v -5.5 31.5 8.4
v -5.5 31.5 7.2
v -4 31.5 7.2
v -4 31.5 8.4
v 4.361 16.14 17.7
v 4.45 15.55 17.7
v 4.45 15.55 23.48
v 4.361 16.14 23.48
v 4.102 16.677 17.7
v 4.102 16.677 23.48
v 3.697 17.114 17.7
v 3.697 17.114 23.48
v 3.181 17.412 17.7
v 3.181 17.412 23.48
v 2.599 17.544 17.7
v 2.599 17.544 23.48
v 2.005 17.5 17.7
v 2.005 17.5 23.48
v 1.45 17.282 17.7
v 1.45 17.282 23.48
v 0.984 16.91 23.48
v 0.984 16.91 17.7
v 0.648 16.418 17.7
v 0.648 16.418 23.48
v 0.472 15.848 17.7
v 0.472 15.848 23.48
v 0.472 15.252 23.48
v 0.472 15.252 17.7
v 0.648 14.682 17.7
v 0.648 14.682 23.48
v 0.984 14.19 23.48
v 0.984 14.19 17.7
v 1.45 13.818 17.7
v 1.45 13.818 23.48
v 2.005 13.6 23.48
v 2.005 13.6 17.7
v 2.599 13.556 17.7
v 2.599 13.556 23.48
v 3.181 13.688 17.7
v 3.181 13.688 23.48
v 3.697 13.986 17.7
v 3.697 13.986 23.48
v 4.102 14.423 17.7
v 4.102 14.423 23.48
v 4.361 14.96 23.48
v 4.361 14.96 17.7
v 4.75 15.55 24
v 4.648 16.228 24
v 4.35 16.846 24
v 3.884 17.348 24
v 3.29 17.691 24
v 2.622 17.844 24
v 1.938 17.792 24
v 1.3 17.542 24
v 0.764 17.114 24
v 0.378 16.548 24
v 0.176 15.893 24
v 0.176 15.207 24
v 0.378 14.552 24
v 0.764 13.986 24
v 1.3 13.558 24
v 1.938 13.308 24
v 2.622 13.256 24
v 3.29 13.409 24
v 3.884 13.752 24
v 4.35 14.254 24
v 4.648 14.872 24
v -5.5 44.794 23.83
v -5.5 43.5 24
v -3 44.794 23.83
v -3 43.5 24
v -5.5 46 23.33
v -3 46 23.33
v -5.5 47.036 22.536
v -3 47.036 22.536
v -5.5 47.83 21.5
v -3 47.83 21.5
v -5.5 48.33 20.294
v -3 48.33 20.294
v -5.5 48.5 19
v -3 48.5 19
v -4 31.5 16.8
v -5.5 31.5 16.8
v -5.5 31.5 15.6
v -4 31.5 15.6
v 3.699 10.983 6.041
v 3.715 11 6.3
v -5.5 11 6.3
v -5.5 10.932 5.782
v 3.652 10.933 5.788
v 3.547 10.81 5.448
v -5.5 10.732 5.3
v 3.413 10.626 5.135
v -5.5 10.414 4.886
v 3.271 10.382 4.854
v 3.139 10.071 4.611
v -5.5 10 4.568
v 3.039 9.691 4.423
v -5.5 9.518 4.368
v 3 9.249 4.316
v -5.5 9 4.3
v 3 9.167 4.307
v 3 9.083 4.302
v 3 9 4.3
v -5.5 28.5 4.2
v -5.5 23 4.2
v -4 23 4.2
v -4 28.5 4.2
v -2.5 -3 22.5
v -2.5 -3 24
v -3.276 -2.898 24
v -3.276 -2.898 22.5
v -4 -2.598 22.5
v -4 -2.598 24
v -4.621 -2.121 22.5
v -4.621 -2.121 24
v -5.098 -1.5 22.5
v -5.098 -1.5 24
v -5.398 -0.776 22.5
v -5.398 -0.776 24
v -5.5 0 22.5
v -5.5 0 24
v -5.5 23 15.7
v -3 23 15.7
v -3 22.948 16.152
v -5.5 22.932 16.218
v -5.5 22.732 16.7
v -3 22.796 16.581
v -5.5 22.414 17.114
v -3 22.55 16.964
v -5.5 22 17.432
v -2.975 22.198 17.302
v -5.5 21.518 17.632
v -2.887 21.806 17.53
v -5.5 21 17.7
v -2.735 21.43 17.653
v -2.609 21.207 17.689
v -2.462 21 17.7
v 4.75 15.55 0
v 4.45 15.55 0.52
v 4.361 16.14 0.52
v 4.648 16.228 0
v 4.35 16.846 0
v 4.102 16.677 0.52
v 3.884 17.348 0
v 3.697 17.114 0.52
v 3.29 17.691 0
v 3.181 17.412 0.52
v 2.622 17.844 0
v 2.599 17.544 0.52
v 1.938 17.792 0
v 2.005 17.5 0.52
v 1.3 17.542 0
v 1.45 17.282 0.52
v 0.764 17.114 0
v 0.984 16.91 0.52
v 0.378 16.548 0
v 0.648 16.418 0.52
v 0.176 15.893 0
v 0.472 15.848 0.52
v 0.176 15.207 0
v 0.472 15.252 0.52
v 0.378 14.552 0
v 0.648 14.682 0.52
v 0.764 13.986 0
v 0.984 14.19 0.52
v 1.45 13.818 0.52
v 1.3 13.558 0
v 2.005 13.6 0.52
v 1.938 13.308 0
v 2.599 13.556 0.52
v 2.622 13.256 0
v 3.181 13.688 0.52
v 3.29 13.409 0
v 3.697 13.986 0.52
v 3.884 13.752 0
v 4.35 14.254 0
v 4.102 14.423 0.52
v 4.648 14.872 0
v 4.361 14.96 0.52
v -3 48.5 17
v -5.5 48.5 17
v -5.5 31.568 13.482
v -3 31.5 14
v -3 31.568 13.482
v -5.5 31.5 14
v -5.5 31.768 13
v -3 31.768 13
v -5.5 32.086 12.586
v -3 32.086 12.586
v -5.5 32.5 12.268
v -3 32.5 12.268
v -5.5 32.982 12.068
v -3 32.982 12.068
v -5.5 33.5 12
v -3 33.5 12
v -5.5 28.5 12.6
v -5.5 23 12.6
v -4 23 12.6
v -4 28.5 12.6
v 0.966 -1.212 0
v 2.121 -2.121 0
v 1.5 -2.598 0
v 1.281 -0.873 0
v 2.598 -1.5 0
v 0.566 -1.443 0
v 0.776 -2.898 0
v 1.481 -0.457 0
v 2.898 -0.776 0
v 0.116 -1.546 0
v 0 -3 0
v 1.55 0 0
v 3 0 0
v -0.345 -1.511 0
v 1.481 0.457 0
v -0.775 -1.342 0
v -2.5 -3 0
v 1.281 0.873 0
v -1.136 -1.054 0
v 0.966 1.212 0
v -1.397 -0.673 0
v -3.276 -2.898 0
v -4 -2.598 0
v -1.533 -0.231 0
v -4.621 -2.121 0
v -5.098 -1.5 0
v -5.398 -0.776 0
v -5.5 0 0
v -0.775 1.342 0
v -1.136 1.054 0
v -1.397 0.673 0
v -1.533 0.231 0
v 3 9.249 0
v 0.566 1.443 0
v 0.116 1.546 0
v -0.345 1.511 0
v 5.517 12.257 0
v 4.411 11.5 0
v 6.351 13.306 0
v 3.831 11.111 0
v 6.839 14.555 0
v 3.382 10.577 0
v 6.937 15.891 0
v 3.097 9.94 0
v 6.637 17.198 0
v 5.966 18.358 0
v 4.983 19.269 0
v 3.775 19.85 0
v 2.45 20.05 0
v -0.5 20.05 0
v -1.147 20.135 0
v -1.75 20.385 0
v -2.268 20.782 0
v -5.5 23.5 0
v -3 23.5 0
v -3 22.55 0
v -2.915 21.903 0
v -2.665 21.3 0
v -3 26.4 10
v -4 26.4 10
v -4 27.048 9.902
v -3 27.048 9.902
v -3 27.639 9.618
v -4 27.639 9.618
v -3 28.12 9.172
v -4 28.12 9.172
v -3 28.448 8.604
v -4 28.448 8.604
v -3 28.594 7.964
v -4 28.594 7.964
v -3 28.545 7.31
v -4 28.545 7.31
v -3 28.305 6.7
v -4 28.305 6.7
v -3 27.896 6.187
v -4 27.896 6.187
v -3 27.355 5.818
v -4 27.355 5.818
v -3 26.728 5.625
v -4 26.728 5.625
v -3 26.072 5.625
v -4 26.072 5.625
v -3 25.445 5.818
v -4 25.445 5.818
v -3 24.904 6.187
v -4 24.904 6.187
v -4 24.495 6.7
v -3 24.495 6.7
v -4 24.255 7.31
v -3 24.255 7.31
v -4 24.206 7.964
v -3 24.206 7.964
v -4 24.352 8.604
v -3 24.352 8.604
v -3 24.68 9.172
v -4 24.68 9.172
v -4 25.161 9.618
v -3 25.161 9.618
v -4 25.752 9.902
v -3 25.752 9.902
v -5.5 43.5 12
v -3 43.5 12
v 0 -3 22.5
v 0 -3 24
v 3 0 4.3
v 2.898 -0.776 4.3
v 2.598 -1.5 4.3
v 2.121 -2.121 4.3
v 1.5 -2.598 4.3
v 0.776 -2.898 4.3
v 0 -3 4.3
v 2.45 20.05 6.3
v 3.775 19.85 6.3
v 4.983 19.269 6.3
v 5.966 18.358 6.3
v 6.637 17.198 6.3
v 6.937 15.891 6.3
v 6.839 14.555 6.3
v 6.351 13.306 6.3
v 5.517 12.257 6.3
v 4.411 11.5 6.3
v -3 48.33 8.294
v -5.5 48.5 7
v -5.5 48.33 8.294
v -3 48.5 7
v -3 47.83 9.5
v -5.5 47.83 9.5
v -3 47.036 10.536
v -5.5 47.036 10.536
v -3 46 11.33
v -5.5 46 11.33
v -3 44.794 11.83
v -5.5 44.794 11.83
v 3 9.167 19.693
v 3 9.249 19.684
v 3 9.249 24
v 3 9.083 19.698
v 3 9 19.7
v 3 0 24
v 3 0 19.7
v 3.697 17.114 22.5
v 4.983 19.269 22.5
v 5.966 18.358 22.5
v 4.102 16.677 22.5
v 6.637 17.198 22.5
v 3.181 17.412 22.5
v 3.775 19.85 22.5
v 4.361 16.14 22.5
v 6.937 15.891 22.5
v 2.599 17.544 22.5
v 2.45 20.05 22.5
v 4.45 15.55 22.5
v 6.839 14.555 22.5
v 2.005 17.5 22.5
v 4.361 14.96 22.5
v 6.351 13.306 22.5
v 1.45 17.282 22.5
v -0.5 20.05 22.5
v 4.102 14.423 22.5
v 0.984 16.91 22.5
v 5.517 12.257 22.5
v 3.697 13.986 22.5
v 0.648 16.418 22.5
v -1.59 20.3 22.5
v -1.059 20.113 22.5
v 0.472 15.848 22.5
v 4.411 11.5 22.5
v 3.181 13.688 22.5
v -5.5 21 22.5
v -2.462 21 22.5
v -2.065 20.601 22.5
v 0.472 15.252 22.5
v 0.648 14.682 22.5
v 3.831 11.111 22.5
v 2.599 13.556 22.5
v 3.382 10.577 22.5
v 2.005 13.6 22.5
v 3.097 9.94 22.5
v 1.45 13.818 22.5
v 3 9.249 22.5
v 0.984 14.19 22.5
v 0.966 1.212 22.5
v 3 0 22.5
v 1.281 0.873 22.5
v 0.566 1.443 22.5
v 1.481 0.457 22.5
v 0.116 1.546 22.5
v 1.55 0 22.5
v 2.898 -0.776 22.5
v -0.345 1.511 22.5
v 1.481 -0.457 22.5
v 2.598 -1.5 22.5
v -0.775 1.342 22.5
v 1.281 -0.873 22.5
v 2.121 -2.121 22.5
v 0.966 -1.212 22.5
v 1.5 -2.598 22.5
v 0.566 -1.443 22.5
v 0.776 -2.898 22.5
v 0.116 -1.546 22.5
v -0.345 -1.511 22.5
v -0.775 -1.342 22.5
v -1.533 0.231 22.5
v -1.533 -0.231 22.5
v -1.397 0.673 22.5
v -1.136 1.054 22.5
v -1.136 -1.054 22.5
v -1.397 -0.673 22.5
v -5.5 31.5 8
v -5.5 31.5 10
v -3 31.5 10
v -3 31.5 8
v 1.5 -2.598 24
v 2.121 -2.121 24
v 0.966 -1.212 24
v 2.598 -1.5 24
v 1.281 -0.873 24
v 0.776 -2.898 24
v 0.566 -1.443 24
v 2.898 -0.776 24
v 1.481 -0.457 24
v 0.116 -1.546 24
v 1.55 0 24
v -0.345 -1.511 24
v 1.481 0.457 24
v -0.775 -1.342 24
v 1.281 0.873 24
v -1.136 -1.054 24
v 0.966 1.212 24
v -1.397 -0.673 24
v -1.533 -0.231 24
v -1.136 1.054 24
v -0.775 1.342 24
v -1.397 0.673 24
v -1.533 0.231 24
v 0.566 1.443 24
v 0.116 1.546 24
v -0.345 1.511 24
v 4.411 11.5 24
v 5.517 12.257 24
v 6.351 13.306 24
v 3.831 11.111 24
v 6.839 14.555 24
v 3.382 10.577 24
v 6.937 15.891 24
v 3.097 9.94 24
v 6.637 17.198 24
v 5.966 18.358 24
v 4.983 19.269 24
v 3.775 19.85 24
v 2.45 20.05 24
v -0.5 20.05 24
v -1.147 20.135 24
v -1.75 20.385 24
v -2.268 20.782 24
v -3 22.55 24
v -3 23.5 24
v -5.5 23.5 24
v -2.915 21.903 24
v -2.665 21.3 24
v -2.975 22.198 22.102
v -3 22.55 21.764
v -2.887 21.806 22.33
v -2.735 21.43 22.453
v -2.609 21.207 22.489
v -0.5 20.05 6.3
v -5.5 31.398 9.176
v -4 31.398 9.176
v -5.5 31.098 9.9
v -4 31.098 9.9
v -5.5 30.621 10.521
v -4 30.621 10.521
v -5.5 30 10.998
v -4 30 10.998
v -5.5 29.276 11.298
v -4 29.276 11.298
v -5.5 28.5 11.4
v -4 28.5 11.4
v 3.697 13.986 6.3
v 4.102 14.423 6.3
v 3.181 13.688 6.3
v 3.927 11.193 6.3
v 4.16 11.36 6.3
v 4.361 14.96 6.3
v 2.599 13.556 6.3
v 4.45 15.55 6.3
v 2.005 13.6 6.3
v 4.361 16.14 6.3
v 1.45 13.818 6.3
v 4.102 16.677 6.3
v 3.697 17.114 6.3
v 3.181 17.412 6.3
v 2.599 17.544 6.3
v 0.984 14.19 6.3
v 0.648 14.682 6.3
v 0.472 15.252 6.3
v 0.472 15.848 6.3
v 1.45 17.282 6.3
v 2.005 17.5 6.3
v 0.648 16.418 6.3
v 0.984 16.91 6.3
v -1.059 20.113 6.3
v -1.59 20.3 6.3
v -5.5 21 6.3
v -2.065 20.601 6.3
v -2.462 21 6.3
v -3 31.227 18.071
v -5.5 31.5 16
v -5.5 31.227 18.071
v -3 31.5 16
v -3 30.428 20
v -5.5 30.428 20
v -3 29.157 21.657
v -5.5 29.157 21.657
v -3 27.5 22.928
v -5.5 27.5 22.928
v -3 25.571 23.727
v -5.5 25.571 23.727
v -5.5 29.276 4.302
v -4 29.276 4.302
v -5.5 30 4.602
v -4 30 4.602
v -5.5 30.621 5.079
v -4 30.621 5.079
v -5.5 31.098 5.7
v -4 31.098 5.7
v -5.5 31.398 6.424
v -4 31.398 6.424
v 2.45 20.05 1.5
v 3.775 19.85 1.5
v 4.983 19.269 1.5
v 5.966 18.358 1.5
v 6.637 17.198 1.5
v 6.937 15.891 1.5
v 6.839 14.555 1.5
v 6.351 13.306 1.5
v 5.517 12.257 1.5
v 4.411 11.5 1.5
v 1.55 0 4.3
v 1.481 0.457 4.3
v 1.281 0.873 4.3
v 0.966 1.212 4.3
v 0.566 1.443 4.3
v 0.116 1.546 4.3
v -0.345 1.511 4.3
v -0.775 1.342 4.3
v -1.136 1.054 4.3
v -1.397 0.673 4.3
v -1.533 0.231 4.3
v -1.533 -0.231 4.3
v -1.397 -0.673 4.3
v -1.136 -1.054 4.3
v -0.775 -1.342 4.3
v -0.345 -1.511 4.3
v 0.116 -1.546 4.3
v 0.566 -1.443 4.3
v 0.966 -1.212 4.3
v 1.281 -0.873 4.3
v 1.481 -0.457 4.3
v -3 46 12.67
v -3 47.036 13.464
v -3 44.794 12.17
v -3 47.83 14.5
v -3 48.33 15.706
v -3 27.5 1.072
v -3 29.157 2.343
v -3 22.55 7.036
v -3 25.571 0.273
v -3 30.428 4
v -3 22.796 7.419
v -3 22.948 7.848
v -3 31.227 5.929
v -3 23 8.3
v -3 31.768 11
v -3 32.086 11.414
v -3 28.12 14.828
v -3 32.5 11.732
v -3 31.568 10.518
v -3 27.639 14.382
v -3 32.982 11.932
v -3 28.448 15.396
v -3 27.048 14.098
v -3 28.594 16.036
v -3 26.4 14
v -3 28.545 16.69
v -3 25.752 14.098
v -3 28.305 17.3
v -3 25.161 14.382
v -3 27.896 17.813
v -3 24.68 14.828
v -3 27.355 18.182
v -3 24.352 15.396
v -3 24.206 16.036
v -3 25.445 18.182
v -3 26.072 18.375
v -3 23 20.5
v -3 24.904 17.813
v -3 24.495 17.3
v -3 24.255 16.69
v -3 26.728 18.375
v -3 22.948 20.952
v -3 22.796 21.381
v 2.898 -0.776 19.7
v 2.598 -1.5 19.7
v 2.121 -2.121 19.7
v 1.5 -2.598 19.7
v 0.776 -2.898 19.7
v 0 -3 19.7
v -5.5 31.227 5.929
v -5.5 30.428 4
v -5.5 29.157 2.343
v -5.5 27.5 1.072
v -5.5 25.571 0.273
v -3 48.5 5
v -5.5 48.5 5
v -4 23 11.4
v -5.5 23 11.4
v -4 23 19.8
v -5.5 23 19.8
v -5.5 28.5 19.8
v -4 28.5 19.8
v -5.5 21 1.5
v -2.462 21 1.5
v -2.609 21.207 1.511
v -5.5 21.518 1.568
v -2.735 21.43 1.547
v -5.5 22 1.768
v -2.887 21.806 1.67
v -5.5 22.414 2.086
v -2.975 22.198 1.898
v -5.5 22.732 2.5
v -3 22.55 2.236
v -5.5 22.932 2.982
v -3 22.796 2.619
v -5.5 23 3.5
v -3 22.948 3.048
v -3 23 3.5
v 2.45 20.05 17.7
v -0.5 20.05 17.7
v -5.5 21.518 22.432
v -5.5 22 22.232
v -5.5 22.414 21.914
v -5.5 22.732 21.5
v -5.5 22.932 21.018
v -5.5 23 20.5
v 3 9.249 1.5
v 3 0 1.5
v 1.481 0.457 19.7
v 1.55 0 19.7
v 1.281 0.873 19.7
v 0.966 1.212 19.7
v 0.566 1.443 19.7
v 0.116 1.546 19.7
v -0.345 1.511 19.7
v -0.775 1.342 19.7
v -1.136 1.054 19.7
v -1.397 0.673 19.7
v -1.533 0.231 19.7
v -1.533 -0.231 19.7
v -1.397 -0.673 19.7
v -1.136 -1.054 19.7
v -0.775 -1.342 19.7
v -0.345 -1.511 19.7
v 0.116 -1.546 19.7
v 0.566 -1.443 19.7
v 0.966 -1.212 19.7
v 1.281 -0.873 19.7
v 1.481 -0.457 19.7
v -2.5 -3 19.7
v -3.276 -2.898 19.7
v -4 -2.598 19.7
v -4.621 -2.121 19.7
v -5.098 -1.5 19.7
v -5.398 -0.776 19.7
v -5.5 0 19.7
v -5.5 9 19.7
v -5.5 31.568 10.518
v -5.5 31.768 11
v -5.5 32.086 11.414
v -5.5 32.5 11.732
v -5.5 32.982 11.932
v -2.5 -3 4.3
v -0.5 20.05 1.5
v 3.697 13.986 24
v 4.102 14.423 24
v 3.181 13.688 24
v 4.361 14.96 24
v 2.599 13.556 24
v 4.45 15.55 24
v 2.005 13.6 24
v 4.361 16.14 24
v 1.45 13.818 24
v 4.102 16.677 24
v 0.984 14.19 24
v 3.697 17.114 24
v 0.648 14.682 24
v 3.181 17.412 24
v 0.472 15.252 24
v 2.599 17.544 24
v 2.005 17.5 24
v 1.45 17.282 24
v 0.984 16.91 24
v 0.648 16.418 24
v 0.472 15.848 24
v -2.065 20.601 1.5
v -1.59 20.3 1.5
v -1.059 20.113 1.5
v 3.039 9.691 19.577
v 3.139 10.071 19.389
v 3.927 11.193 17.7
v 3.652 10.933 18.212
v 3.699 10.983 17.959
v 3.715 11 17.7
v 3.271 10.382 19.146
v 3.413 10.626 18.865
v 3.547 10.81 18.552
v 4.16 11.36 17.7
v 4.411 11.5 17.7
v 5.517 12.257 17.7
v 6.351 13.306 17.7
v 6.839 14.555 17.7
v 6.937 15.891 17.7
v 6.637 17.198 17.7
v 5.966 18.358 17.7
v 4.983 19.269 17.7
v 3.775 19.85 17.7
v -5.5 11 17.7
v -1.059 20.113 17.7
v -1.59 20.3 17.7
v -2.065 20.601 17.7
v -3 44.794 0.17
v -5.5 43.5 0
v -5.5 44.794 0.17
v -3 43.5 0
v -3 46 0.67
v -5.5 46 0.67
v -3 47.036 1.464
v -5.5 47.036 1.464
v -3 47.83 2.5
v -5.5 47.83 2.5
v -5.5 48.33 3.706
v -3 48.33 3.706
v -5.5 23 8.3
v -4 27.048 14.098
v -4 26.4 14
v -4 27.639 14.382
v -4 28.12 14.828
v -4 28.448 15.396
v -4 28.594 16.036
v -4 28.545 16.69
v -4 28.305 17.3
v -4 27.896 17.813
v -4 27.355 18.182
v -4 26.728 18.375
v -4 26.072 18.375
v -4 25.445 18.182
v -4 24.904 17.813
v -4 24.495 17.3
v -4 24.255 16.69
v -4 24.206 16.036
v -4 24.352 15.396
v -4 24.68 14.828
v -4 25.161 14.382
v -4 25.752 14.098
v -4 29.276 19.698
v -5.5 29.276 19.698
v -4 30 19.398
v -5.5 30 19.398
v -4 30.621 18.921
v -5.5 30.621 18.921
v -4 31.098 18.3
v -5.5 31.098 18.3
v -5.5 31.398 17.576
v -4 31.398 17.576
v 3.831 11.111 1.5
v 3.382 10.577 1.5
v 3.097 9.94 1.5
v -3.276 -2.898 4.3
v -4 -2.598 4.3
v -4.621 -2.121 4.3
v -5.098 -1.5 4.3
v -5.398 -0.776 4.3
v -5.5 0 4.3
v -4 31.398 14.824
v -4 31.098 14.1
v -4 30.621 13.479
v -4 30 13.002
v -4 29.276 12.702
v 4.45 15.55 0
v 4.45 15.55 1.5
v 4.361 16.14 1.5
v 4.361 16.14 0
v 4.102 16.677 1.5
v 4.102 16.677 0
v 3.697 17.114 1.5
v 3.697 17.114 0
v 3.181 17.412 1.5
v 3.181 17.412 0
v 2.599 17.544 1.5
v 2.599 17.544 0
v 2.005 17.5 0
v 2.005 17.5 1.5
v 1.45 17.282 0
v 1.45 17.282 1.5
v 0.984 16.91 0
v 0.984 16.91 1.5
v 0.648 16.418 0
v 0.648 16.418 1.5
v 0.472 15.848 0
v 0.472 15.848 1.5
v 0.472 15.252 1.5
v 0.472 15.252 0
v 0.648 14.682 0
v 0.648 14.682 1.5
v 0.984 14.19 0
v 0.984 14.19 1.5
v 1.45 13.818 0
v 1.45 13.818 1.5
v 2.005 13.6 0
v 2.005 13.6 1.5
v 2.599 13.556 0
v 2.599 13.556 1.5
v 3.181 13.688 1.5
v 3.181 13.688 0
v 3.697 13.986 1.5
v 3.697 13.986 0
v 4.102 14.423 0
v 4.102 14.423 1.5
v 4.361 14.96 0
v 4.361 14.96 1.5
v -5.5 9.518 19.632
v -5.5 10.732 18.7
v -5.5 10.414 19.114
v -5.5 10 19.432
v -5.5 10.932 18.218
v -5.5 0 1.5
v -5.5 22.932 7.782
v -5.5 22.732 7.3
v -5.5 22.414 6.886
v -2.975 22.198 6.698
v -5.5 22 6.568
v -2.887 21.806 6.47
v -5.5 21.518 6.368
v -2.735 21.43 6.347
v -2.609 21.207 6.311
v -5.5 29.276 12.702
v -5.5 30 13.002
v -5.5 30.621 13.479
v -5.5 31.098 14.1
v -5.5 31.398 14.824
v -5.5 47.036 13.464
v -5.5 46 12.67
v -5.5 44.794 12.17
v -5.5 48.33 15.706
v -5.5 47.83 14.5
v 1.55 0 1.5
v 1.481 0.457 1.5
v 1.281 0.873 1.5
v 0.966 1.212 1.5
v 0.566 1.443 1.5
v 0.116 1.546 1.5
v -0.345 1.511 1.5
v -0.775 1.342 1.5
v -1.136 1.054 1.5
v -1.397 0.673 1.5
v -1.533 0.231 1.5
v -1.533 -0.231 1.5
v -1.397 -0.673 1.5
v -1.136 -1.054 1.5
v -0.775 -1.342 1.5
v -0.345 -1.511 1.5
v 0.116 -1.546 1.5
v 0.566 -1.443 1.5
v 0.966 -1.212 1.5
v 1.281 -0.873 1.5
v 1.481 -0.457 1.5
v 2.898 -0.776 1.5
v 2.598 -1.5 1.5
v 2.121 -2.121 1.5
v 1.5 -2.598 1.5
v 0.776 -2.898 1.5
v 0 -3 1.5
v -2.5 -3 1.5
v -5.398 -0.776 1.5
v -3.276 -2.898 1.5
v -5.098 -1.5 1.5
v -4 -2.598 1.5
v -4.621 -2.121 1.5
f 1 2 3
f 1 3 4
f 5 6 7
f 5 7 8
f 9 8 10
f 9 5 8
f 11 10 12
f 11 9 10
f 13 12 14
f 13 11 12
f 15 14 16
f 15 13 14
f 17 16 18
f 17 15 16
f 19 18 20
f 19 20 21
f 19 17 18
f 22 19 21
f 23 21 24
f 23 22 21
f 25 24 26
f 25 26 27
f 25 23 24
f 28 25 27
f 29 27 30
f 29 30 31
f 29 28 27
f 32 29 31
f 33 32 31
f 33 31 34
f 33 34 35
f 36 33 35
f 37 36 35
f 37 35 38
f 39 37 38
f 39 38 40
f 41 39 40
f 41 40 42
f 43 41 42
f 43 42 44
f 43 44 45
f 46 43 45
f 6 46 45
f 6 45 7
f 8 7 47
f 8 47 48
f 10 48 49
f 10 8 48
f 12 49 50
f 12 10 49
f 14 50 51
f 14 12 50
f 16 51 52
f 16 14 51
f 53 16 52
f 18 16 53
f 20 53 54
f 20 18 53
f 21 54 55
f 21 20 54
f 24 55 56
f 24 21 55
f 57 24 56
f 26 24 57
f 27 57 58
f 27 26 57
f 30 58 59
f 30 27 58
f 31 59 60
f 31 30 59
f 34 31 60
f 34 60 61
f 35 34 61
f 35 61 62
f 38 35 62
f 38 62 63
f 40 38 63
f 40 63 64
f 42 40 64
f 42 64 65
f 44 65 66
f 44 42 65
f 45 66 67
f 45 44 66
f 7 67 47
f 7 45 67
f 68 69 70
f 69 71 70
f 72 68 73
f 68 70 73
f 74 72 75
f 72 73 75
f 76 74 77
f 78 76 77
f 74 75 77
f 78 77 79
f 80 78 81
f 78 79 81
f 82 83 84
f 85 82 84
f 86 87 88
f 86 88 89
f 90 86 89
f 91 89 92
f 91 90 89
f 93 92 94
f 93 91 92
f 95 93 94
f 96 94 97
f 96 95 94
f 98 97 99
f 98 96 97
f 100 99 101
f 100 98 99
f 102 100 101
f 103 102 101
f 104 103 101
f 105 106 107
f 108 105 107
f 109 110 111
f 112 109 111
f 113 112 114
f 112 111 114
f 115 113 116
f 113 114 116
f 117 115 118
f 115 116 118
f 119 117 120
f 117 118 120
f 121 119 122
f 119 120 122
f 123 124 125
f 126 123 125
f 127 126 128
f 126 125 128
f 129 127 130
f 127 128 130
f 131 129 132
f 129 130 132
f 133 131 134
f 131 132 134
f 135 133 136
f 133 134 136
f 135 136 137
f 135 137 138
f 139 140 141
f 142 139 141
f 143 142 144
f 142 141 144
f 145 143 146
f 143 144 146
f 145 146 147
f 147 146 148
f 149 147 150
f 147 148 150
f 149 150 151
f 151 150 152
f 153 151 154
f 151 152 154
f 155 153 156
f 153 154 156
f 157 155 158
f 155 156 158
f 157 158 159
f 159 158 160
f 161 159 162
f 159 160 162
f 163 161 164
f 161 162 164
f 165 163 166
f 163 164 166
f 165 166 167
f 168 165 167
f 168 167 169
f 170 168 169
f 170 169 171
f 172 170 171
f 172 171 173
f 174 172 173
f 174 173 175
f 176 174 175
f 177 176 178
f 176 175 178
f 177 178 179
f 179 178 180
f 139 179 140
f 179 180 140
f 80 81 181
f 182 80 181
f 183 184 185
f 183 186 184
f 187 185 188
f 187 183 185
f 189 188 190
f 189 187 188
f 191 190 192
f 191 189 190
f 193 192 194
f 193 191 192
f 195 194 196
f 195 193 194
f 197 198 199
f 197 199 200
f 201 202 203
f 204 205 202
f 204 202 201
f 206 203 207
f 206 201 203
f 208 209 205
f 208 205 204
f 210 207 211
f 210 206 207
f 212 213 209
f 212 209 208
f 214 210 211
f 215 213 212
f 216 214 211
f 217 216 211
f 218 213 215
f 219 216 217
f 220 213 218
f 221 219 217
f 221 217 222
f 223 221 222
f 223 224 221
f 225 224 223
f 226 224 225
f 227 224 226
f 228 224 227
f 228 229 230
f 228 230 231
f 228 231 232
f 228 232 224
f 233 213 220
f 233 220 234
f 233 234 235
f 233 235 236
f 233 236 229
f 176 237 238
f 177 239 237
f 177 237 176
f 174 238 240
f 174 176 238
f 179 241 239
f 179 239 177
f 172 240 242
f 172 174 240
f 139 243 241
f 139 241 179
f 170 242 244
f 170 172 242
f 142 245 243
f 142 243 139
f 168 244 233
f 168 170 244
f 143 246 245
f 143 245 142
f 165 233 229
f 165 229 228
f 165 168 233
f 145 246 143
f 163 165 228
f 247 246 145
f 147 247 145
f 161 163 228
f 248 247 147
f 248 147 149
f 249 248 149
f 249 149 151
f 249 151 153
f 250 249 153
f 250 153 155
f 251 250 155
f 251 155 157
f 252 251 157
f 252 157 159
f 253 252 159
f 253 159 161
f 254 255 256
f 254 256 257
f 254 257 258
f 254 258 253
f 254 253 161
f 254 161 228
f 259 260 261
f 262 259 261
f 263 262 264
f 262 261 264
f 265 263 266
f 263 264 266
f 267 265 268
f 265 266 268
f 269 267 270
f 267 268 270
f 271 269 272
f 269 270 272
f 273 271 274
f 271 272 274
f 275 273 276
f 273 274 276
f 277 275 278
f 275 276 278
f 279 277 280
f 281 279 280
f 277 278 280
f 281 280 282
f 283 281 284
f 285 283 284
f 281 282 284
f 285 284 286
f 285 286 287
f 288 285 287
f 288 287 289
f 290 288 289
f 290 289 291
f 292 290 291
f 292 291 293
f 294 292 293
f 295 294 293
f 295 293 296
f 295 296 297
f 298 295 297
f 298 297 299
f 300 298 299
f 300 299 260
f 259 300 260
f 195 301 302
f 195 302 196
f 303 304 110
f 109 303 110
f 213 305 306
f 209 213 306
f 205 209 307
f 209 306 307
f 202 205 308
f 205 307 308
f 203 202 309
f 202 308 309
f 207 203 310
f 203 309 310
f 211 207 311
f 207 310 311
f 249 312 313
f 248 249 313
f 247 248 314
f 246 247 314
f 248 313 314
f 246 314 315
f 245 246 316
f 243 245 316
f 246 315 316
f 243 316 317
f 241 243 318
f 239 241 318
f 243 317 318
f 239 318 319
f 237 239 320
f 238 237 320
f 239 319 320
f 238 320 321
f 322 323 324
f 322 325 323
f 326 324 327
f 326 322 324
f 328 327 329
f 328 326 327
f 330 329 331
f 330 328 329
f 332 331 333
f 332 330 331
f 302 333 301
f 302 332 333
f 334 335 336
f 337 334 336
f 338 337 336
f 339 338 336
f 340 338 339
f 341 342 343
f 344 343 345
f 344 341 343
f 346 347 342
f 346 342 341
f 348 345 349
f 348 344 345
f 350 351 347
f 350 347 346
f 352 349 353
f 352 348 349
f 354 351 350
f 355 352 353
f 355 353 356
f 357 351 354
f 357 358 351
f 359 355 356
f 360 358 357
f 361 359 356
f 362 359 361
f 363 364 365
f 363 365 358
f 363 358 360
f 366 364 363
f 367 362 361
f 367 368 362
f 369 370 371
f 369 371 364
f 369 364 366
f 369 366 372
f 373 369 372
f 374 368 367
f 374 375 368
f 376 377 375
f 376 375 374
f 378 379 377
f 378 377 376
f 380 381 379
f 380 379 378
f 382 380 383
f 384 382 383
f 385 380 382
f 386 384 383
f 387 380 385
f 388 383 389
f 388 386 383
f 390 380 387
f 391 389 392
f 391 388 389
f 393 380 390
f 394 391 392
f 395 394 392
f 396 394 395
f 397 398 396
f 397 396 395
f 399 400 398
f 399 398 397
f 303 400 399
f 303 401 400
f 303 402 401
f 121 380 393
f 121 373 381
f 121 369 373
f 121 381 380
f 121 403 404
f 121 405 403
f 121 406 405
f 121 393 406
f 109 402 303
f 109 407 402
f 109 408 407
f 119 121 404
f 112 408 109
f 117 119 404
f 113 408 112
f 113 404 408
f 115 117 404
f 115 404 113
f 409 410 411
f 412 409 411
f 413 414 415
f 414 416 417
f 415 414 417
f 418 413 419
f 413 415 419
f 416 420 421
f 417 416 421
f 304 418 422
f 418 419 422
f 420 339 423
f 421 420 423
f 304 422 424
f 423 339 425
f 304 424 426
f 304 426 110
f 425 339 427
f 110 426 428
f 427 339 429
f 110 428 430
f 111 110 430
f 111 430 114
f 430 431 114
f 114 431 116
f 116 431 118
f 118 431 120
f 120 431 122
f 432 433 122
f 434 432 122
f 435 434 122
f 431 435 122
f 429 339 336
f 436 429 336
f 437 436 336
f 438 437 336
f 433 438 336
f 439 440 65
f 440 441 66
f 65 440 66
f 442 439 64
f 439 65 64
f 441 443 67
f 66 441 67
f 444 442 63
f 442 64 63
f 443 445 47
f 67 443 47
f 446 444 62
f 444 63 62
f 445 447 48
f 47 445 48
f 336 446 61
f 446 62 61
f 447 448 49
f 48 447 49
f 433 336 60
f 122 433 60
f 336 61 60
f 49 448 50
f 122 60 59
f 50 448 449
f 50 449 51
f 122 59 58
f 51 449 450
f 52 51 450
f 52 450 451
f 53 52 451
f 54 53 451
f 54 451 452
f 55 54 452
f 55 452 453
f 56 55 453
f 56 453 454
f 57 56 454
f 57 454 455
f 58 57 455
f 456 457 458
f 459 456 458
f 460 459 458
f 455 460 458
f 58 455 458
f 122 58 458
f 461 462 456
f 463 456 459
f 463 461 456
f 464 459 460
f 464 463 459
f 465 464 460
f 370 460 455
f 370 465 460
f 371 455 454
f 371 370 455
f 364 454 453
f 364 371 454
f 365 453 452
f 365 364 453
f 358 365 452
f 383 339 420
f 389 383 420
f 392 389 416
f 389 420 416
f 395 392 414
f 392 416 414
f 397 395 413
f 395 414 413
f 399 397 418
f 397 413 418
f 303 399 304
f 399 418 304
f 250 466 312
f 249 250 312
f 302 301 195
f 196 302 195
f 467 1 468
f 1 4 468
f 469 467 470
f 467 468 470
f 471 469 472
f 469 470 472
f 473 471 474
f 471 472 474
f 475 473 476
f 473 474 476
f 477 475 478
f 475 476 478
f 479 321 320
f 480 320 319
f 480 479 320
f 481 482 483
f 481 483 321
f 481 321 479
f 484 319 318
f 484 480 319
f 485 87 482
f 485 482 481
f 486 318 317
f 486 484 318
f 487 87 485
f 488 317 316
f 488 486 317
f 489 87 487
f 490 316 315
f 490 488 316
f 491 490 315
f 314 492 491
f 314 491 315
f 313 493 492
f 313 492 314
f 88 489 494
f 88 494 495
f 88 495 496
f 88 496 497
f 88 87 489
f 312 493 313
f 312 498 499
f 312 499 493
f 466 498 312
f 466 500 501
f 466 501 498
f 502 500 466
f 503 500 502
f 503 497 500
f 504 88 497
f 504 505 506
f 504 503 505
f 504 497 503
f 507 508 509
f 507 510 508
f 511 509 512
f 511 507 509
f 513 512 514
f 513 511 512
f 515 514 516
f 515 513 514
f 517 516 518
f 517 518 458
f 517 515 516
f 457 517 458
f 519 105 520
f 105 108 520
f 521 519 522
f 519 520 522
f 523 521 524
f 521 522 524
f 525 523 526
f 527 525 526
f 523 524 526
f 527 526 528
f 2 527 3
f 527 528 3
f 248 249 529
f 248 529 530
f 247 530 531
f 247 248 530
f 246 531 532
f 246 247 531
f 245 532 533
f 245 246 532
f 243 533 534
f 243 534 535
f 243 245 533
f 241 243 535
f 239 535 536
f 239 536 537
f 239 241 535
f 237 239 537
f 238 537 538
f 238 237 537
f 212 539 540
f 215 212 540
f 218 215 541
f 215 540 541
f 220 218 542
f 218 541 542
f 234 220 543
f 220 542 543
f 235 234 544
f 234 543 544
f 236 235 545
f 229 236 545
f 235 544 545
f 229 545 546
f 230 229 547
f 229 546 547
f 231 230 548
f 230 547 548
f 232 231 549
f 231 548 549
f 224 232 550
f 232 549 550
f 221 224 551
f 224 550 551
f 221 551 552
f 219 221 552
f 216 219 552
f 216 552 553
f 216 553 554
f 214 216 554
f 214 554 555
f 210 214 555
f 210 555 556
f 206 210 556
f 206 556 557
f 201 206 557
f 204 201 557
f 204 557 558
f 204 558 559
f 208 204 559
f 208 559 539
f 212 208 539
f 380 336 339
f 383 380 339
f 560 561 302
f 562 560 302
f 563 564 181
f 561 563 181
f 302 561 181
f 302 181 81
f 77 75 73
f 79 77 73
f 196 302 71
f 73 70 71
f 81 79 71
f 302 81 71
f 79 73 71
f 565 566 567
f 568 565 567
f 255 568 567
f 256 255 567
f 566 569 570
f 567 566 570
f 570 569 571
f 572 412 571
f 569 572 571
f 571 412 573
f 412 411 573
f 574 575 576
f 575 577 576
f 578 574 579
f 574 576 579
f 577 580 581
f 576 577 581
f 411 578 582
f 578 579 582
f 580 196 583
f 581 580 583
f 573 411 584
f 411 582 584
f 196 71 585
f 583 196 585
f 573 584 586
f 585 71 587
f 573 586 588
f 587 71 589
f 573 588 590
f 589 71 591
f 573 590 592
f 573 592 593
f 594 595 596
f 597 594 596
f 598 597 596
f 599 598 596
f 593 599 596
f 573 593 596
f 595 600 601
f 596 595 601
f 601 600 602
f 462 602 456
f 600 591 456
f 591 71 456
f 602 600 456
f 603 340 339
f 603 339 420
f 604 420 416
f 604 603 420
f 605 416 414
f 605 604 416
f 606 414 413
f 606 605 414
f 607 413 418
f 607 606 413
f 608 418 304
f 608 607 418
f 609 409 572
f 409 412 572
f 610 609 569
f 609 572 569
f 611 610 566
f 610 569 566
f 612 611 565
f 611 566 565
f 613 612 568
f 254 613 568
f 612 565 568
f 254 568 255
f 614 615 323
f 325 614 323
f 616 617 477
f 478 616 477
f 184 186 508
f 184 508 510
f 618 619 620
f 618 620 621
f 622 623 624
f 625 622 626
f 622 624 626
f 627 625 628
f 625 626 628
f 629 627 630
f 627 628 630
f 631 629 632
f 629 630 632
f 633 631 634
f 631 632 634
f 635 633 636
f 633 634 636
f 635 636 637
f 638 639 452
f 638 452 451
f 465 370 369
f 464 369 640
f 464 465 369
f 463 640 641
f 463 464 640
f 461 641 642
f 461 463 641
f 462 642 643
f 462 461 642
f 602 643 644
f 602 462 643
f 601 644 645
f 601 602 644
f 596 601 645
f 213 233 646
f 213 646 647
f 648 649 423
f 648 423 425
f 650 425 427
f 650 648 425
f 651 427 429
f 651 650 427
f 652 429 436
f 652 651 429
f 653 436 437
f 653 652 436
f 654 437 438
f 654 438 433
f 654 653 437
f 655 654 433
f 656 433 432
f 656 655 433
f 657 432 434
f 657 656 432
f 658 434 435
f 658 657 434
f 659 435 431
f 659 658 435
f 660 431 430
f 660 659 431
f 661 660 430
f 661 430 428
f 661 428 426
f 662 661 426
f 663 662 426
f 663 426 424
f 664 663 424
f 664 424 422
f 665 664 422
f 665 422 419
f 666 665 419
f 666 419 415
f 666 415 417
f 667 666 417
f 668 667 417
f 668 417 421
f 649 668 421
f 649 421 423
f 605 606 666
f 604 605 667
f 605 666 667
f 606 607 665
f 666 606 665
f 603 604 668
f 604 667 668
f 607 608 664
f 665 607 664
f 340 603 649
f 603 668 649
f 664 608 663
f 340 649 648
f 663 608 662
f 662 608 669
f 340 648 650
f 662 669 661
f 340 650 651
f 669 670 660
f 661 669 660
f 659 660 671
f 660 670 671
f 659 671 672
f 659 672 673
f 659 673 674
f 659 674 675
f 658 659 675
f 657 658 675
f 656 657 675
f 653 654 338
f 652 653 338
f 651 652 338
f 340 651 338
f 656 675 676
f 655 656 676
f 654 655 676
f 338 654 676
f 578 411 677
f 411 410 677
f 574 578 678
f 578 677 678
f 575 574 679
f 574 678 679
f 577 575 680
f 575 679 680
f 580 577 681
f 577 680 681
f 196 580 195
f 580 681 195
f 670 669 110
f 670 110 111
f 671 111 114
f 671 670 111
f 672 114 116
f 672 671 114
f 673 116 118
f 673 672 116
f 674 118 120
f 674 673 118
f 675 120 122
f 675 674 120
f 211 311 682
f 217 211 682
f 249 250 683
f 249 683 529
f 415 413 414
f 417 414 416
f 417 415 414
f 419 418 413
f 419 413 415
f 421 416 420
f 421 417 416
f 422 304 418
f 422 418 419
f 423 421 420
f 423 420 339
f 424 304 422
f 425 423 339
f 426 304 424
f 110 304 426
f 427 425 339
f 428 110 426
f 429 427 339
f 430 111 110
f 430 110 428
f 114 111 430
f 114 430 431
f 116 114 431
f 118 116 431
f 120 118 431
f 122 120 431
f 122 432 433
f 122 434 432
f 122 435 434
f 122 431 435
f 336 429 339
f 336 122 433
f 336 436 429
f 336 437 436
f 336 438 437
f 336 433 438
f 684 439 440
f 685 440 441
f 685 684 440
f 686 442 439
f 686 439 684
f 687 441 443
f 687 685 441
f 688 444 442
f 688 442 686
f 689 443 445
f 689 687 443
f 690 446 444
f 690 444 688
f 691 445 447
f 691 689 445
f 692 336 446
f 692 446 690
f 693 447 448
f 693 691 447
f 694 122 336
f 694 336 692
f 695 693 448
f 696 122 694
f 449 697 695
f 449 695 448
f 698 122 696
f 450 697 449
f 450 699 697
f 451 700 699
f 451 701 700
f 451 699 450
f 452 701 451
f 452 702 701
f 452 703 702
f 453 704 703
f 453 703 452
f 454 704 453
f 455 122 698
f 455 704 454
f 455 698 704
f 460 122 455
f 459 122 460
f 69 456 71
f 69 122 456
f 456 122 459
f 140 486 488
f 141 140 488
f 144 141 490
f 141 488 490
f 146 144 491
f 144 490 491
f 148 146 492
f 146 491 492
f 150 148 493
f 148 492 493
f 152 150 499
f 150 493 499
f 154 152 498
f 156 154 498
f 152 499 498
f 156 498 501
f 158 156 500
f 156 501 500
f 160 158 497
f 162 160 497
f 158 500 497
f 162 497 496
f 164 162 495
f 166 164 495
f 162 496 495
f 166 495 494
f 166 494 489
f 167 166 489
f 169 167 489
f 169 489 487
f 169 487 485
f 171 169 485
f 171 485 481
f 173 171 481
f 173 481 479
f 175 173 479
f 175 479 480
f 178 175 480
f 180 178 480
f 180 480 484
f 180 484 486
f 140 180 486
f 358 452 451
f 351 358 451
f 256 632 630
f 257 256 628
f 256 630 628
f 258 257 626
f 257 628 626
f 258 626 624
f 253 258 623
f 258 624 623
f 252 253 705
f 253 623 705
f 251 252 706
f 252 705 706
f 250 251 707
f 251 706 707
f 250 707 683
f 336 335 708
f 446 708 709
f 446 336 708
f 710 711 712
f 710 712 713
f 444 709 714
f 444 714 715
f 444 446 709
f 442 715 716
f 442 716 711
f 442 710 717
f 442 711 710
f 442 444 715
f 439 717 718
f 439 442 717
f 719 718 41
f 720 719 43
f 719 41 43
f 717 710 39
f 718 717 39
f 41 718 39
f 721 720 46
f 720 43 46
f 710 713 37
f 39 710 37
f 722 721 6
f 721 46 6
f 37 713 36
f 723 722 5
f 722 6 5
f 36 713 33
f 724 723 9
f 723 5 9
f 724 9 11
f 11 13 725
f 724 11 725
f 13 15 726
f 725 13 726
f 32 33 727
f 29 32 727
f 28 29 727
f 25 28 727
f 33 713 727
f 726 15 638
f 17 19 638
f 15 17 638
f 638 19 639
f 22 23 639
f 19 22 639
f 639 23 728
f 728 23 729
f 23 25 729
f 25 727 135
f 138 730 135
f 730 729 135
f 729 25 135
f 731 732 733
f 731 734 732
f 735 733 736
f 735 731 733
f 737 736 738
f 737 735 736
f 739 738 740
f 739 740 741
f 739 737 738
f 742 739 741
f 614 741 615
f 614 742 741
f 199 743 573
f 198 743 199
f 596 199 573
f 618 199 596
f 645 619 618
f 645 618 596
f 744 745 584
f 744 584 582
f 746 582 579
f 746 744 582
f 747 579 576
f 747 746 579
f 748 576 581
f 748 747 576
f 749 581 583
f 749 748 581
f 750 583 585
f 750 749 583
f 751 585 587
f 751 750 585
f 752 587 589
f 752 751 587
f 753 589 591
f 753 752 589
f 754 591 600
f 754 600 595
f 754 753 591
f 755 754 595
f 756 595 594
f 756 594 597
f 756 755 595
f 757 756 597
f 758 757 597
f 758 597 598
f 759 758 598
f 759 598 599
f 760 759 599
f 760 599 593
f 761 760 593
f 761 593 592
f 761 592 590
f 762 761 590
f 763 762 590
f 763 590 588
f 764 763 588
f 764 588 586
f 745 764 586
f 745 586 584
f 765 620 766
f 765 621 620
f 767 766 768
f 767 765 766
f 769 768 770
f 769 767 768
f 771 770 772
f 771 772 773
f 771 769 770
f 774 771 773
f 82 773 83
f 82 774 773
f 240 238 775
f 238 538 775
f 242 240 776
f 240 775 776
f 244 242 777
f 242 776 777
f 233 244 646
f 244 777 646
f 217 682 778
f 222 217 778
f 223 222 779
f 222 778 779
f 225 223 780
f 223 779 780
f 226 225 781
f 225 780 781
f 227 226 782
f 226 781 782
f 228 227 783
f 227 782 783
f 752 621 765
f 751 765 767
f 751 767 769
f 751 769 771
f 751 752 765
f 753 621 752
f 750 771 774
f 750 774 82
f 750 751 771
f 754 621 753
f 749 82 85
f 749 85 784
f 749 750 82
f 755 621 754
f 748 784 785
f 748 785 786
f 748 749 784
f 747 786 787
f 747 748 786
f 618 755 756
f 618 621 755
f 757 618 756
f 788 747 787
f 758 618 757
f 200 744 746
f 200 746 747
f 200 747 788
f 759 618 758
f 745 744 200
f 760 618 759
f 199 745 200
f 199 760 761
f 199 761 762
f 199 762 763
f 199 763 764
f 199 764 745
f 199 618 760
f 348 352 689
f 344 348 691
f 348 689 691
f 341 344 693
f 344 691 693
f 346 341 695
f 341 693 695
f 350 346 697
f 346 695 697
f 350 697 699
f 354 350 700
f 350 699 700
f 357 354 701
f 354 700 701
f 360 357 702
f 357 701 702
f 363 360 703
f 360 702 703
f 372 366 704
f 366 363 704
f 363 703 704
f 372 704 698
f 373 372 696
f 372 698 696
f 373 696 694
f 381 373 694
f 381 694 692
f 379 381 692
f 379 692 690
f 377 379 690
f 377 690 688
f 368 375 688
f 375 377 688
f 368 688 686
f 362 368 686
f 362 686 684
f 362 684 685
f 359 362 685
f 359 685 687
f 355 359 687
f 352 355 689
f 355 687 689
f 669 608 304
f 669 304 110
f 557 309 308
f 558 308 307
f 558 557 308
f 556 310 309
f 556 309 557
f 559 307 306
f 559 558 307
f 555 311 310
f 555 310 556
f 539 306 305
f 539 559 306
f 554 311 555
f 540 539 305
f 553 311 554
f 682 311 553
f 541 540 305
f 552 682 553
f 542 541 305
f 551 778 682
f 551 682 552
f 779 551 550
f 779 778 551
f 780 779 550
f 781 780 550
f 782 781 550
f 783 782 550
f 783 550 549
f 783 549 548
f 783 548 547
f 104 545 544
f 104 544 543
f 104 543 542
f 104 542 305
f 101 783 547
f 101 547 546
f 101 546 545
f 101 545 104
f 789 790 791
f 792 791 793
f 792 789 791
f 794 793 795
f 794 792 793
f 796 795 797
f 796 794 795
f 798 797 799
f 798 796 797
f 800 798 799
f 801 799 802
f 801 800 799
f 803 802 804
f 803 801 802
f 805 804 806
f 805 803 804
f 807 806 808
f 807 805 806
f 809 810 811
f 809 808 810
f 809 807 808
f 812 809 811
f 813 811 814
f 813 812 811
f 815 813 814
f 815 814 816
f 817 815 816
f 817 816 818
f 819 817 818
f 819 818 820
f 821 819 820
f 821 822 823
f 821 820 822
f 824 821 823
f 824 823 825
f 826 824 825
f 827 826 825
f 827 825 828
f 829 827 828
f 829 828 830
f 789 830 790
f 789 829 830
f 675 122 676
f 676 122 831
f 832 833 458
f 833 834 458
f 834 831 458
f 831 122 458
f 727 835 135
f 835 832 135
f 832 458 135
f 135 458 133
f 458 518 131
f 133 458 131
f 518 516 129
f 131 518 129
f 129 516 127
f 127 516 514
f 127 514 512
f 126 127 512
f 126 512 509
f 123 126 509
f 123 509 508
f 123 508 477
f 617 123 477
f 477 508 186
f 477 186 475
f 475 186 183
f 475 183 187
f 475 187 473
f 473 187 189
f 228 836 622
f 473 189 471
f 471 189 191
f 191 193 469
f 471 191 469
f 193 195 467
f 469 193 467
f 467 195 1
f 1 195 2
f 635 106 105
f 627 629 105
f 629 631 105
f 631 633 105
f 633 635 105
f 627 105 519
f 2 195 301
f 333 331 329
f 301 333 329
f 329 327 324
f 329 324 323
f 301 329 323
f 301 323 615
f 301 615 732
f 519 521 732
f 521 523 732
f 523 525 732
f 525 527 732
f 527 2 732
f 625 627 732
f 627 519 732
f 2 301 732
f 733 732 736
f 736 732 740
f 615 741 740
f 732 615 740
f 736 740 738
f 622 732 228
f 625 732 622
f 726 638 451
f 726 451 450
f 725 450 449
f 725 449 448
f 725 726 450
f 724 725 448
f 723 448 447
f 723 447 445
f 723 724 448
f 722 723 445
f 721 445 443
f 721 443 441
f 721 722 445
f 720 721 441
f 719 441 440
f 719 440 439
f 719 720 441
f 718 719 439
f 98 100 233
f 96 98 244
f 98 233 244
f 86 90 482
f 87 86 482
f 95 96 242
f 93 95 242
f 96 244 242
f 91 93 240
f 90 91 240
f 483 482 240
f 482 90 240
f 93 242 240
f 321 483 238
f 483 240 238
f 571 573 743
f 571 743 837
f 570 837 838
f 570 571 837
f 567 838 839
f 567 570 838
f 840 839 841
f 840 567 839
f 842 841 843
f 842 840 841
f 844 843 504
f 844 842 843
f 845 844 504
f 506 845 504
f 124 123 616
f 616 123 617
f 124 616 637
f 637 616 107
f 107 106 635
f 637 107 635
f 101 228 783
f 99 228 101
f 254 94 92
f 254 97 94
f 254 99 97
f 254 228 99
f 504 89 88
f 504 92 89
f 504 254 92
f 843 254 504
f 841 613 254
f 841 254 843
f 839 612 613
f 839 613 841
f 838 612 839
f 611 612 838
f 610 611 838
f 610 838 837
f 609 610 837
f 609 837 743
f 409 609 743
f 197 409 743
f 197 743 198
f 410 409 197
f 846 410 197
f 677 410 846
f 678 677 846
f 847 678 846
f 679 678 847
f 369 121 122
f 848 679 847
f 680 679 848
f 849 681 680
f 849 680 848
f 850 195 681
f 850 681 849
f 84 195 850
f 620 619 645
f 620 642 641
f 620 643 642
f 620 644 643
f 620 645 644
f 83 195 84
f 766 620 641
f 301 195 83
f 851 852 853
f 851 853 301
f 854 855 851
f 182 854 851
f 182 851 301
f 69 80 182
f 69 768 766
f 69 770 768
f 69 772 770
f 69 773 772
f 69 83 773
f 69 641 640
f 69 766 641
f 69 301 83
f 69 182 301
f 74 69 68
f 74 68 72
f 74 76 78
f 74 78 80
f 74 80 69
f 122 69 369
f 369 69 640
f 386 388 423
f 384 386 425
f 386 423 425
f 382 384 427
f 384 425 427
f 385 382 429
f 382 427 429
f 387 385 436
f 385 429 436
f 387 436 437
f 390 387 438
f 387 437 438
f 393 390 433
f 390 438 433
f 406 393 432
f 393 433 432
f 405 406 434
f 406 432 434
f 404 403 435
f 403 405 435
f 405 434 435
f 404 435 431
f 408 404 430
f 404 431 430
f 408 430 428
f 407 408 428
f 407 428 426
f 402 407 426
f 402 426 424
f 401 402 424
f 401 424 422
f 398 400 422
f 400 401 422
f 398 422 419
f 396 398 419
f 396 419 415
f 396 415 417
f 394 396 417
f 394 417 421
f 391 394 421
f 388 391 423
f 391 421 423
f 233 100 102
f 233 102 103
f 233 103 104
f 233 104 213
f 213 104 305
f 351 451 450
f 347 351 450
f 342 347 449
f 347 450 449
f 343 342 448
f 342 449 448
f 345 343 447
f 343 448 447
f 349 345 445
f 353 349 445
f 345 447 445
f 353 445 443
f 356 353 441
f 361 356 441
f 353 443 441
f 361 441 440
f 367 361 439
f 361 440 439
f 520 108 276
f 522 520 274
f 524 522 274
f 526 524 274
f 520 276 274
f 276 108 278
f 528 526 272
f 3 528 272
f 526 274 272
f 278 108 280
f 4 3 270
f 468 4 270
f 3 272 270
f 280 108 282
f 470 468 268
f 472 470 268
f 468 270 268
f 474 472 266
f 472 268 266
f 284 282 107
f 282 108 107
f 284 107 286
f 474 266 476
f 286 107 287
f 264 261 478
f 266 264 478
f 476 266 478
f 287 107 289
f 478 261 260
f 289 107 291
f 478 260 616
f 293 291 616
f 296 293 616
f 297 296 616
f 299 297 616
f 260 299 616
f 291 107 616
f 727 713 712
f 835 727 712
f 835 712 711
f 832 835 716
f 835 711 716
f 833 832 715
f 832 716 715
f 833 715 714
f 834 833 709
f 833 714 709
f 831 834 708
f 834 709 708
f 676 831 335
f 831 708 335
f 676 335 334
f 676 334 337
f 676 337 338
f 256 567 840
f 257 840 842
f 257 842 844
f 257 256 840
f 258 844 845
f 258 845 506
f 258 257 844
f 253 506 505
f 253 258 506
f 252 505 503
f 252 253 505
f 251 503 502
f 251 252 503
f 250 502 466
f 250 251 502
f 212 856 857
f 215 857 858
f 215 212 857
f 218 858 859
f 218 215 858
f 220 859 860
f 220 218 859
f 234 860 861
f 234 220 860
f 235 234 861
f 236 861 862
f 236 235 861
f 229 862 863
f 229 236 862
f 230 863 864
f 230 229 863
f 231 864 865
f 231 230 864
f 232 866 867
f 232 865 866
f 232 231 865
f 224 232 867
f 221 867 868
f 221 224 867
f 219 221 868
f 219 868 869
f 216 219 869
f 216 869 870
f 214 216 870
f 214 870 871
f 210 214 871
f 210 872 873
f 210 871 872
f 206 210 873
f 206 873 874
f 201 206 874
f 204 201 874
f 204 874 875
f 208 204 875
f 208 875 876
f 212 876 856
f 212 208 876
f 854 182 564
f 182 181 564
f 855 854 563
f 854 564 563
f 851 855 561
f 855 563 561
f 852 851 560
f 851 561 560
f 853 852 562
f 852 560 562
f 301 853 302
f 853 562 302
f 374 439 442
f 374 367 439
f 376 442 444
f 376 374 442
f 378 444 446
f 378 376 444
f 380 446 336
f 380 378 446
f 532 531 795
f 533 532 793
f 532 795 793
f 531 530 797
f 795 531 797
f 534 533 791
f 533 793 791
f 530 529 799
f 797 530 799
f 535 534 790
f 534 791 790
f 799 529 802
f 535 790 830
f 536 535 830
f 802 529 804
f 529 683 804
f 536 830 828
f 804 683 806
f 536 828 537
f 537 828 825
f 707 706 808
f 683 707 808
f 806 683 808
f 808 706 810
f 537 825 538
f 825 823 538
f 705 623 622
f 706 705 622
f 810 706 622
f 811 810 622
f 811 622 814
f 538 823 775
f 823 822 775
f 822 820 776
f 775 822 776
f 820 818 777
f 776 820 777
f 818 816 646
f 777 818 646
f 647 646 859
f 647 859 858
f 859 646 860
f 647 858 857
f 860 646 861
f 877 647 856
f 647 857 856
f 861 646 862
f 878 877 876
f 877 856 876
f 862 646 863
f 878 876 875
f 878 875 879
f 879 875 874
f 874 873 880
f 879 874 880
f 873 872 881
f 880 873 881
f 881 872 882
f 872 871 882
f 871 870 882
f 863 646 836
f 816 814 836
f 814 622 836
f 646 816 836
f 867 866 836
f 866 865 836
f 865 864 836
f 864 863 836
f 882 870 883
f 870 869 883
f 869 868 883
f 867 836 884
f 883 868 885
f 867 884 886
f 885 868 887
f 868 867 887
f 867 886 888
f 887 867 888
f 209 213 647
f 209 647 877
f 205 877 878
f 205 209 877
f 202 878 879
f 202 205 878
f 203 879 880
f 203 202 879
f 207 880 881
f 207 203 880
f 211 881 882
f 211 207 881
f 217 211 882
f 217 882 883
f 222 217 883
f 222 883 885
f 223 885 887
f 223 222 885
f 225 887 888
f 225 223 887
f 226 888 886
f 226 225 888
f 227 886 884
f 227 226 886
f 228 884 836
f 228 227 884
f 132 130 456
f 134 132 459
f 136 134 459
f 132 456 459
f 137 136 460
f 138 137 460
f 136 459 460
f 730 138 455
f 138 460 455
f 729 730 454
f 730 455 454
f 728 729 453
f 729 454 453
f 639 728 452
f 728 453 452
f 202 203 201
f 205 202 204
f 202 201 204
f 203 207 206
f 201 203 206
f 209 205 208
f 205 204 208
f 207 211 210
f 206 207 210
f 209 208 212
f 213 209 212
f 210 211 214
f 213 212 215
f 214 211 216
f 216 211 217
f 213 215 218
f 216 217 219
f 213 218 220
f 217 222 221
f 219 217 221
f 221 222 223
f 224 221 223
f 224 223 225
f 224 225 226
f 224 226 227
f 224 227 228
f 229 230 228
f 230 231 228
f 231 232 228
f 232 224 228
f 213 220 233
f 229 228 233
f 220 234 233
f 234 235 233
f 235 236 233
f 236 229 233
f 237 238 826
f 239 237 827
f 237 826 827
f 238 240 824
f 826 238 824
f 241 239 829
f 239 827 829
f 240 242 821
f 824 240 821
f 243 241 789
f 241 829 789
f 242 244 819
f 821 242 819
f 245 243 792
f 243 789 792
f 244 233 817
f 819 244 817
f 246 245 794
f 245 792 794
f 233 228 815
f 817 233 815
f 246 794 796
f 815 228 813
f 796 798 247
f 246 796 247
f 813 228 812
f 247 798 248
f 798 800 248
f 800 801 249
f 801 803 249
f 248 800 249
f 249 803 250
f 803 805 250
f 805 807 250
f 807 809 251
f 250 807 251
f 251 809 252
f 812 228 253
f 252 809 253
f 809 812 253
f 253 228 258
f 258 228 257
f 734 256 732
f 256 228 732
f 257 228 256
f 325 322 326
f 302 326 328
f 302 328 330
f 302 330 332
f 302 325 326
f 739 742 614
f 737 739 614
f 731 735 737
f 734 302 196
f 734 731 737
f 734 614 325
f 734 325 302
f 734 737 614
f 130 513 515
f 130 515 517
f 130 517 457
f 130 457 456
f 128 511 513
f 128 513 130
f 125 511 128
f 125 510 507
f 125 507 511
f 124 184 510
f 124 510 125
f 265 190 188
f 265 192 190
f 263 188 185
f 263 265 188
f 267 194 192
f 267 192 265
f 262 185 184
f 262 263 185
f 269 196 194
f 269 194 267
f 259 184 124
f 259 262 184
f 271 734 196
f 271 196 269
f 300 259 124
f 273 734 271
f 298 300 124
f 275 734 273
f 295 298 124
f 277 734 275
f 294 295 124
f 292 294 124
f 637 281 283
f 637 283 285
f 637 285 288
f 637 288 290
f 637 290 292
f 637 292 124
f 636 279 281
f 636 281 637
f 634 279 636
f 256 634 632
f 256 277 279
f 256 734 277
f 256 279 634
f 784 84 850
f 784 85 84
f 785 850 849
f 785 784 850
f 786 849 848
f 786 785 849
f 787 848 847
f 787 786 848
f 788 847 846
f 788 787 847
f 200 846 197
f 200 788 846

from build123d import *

# Parameters (mm, degrees)
CROQUIS1_R              = 2
CROQUIS1_R_2            = 1.55
SALIENTE_EXTRUIR1_DEPTH = 24
CORTAR_EXTRUIR1_DEPTH   = 20
REDONDEO1_R             = 8
REDONDEO2_R             = 2
REDONDEO5_R             = 2.5
CROQUIS3_R              = 2.2
CORTAR_EXTRUIR2_DEPTH   = 20
CROQUIS4_W              = 1.5
CROQUIS4_H              = 7.2
CORTAR_EXTRUIR3_DEPTH   = 20
SALIENTE_EXTRUIR2_REACH = 43.512
REDONDEO7_R             = 2
CROQUIS6_W              = 7.2
CROQUIS6_H              = 3
CORTAR_EXTRUIR4_DEPTH   = 1.5
REDONDEO8_R             = 3
REDONDEO9_R             = 5
CHAFL_N1_SIZE           = 0.3
CHAFL_N1_SIZE2          = 0.519615242


with BuildPart() as part:
    # Croquis1 → Saliente-Extruir1 (new body)
    with BuildSketch(Plane.XY):
        with BuildLine():
            Line((-5.5, 0), (-5.5, 31.5))
            Line((-5.5, 31.5), (-3, 31.5))
            Line((-3, 31.5), (-3, 20.05))
            Line((-3, 20.05), (2.45, 20.05))
            ThreePointArc((2.45, 20.05), (6.941557686, 15.825516889), (3, 11.08373758))
            Line((3, 11.08373758), (3, 0))
            ThreePointArc((3, 0), (2.121320344, -2.121320344), (0, -3))
            Line((0, -3), (-2.5, -3))
            ThreePointArc((-2.5, -3), (-4.621320344, -2.121320344), (-5.5, 0))
        make_face()
        with Locations((2.45, 15.55)):
            Circle(CROQUIS1_R, mode=Mode.SUBTRACT)
        Circle(CROQUIS1_R_2, mode=Mode.SUBTRACT)
    extrude(amount=SALIENTE_EXTRUIR1_DEPTH)

    # Croquis2 → Cortar-Extruir1 (cut)
    with BuildSketch(Plane.ZY.offset(5.5)):
        Polygon((1.5, -3), (19.7, -3), (19.7, 11), (17.7, 11), (17.7, 23), (1.5, 23), align=None)
    extrude(amount=-CORTAR_EXTRUIR1_DEPTH, mode=Mode.SUBTRACT)

    # Redondeo1
    redondeo1_edges = [part.edges().sort_by_distance(p)[0] for p in [
        (-4.25, 31.5, 0),
        (-4.25, 31.5, 24),
    ]]
    fillet(redondeo1_edges, radius=REDONDEO1_R)

    # Redondeo2
    redondeo2_edges = [part.edges().sort_by_distance(p)[0] for p in [
        (-1.25, 11, 19.7),
        (-4.25, 23, 17.7),
        (-4.25, 23, 1.5),
    ]]
    fillet(redondeo2_edges, radius=REDONDEO2_R - 0.0001)  # a hair under: the kernel refuses the full size

    # Redondeo5
    redondeo5_edges = [part.edges().sort_by_distance(p)[0] for p in [
        (3, 11.08373758, 0.75),
        (-3, 20.05, 20.85),
        (3, 11.08373758, 20.85),
        (-3, 20.05, 0.75),
    ]]
    fillet(redondeo5_edges, radius=REDONDEO5_R)

    # Croquis3 → Cortar-Extruir2 (cut)
    with BuildSketch(Plane.ZY.offset(5.5)):
        with Locations((7.8, 26.4)):
            Circle(CROQUIS3_R)
    extrude(amount=-CORTAR_EXTRUIR2_DEPTH, mode=Mode.SUBTRACT)

    # Croquis4 → Cortar-Extruir3 (cut)
    with BuildSketch(Plane.XZ.offset(-23)):
        with Locations((-4.75, 7.8)):
            Rectangle(CROQUIS4_W, CROQUIS4_H)
    extrude(amount=-CORTAR_EXTRUIR3_DEPTH, mode=Mode.SUBTRACT)

    # Saliente-Extruir2: up to this face of the body (flat: up to its plane)
    saliente_extruir2_end = Plane(part.part.faces().sort_by_distance((-3, 26.79790631, 12.475730365))[0])
    # Croquis5 → Saliente-Extruir2 (add, up to the picked face)
    with BuildSketch(Plane.ZY.offset(5.5), mode=Mode.PRIVATE) as saliente_extruir2_sk1:
        Polygon((0, 23.5), (0, 48.5), (12, 48.5), (12, 30), (4.2, 30), align=None)
    saliente_extruir2_tool1 = split(extrude(saliente_extruir2_sk1.sketch, amount=-SALIENTE_EXTRUIR2_REACH, mode=Mode.PRIVATE), bisect_by=saliente_extruir2_end, keep=Keep.BOTH, mode=Mode.PRIVATE)
    add(saliente_extruir2_tool1.solids().sort_by(Axis((-5.5, 38.588691, 5.733546), (1, 0, 0)))[0])

    # Redondeo7
    redondeo7_edges = [part.edges().sort_by_distance(p)[0] for p in [
        (-4.25, 31.5, 12),
    ]]
    fillet(redondeo7_edges, radius=REDONDEO7_R)

    # Croquis6 → Cortar-Extruir4 (cut)
    with BuildSketch(Plane.ZY.offset(5.5)):
        with Locations((7.8, 30)):
            Rectangle(CROQUIS6_W, CROQUIS6_H)
    extrude(amount=-CORTAR_EXTRUIR4_DEPTH, mode=Mode.SUBTRACT)

    # Redondeo8
    redondeo8_edges = [part.edges().sort_by_distance(p)[0] for p in [
        (-4.75, 31.5, 4.2),
        (-4.75, 31.5, 11.4),
    ]]
    fillet(redondeo8_edges, radius=REDONDEO8_R)

    # Redondeo9
    redondeo9_edges = [part.edges().sort_by_distance(p)[0] for p in [
        (-4.25, 48.5, 12),
        (-4.25, 48.5, 0),
    ]]
    fillet(redondeo9_edges, radius=REDONDEO9_R)

    # Chaflán1
    chafl_n1_edges = [part.edges().sort_by_distance(p)[0] for p in [
        (0.45, 15.55, 24),
    ]]
    chafl_n1_side = [part.faces().sort_by_distance(p)[0] for p in [
        (-0.877926413, 10.141568141, 24),
    ]]
    chamfer(chafl_n1_edges, length=CHAFL_N1_SIZE, length2=CHAFL_N1_SIZE2, reference=chafl_n1_side[0])


with BuildPart() as body_2:
    # Simetría1: mirrored copy
    add(part.part.mirror(Plane.XY.offset(12)))


solid = Compound([part.part, body_2.part])
